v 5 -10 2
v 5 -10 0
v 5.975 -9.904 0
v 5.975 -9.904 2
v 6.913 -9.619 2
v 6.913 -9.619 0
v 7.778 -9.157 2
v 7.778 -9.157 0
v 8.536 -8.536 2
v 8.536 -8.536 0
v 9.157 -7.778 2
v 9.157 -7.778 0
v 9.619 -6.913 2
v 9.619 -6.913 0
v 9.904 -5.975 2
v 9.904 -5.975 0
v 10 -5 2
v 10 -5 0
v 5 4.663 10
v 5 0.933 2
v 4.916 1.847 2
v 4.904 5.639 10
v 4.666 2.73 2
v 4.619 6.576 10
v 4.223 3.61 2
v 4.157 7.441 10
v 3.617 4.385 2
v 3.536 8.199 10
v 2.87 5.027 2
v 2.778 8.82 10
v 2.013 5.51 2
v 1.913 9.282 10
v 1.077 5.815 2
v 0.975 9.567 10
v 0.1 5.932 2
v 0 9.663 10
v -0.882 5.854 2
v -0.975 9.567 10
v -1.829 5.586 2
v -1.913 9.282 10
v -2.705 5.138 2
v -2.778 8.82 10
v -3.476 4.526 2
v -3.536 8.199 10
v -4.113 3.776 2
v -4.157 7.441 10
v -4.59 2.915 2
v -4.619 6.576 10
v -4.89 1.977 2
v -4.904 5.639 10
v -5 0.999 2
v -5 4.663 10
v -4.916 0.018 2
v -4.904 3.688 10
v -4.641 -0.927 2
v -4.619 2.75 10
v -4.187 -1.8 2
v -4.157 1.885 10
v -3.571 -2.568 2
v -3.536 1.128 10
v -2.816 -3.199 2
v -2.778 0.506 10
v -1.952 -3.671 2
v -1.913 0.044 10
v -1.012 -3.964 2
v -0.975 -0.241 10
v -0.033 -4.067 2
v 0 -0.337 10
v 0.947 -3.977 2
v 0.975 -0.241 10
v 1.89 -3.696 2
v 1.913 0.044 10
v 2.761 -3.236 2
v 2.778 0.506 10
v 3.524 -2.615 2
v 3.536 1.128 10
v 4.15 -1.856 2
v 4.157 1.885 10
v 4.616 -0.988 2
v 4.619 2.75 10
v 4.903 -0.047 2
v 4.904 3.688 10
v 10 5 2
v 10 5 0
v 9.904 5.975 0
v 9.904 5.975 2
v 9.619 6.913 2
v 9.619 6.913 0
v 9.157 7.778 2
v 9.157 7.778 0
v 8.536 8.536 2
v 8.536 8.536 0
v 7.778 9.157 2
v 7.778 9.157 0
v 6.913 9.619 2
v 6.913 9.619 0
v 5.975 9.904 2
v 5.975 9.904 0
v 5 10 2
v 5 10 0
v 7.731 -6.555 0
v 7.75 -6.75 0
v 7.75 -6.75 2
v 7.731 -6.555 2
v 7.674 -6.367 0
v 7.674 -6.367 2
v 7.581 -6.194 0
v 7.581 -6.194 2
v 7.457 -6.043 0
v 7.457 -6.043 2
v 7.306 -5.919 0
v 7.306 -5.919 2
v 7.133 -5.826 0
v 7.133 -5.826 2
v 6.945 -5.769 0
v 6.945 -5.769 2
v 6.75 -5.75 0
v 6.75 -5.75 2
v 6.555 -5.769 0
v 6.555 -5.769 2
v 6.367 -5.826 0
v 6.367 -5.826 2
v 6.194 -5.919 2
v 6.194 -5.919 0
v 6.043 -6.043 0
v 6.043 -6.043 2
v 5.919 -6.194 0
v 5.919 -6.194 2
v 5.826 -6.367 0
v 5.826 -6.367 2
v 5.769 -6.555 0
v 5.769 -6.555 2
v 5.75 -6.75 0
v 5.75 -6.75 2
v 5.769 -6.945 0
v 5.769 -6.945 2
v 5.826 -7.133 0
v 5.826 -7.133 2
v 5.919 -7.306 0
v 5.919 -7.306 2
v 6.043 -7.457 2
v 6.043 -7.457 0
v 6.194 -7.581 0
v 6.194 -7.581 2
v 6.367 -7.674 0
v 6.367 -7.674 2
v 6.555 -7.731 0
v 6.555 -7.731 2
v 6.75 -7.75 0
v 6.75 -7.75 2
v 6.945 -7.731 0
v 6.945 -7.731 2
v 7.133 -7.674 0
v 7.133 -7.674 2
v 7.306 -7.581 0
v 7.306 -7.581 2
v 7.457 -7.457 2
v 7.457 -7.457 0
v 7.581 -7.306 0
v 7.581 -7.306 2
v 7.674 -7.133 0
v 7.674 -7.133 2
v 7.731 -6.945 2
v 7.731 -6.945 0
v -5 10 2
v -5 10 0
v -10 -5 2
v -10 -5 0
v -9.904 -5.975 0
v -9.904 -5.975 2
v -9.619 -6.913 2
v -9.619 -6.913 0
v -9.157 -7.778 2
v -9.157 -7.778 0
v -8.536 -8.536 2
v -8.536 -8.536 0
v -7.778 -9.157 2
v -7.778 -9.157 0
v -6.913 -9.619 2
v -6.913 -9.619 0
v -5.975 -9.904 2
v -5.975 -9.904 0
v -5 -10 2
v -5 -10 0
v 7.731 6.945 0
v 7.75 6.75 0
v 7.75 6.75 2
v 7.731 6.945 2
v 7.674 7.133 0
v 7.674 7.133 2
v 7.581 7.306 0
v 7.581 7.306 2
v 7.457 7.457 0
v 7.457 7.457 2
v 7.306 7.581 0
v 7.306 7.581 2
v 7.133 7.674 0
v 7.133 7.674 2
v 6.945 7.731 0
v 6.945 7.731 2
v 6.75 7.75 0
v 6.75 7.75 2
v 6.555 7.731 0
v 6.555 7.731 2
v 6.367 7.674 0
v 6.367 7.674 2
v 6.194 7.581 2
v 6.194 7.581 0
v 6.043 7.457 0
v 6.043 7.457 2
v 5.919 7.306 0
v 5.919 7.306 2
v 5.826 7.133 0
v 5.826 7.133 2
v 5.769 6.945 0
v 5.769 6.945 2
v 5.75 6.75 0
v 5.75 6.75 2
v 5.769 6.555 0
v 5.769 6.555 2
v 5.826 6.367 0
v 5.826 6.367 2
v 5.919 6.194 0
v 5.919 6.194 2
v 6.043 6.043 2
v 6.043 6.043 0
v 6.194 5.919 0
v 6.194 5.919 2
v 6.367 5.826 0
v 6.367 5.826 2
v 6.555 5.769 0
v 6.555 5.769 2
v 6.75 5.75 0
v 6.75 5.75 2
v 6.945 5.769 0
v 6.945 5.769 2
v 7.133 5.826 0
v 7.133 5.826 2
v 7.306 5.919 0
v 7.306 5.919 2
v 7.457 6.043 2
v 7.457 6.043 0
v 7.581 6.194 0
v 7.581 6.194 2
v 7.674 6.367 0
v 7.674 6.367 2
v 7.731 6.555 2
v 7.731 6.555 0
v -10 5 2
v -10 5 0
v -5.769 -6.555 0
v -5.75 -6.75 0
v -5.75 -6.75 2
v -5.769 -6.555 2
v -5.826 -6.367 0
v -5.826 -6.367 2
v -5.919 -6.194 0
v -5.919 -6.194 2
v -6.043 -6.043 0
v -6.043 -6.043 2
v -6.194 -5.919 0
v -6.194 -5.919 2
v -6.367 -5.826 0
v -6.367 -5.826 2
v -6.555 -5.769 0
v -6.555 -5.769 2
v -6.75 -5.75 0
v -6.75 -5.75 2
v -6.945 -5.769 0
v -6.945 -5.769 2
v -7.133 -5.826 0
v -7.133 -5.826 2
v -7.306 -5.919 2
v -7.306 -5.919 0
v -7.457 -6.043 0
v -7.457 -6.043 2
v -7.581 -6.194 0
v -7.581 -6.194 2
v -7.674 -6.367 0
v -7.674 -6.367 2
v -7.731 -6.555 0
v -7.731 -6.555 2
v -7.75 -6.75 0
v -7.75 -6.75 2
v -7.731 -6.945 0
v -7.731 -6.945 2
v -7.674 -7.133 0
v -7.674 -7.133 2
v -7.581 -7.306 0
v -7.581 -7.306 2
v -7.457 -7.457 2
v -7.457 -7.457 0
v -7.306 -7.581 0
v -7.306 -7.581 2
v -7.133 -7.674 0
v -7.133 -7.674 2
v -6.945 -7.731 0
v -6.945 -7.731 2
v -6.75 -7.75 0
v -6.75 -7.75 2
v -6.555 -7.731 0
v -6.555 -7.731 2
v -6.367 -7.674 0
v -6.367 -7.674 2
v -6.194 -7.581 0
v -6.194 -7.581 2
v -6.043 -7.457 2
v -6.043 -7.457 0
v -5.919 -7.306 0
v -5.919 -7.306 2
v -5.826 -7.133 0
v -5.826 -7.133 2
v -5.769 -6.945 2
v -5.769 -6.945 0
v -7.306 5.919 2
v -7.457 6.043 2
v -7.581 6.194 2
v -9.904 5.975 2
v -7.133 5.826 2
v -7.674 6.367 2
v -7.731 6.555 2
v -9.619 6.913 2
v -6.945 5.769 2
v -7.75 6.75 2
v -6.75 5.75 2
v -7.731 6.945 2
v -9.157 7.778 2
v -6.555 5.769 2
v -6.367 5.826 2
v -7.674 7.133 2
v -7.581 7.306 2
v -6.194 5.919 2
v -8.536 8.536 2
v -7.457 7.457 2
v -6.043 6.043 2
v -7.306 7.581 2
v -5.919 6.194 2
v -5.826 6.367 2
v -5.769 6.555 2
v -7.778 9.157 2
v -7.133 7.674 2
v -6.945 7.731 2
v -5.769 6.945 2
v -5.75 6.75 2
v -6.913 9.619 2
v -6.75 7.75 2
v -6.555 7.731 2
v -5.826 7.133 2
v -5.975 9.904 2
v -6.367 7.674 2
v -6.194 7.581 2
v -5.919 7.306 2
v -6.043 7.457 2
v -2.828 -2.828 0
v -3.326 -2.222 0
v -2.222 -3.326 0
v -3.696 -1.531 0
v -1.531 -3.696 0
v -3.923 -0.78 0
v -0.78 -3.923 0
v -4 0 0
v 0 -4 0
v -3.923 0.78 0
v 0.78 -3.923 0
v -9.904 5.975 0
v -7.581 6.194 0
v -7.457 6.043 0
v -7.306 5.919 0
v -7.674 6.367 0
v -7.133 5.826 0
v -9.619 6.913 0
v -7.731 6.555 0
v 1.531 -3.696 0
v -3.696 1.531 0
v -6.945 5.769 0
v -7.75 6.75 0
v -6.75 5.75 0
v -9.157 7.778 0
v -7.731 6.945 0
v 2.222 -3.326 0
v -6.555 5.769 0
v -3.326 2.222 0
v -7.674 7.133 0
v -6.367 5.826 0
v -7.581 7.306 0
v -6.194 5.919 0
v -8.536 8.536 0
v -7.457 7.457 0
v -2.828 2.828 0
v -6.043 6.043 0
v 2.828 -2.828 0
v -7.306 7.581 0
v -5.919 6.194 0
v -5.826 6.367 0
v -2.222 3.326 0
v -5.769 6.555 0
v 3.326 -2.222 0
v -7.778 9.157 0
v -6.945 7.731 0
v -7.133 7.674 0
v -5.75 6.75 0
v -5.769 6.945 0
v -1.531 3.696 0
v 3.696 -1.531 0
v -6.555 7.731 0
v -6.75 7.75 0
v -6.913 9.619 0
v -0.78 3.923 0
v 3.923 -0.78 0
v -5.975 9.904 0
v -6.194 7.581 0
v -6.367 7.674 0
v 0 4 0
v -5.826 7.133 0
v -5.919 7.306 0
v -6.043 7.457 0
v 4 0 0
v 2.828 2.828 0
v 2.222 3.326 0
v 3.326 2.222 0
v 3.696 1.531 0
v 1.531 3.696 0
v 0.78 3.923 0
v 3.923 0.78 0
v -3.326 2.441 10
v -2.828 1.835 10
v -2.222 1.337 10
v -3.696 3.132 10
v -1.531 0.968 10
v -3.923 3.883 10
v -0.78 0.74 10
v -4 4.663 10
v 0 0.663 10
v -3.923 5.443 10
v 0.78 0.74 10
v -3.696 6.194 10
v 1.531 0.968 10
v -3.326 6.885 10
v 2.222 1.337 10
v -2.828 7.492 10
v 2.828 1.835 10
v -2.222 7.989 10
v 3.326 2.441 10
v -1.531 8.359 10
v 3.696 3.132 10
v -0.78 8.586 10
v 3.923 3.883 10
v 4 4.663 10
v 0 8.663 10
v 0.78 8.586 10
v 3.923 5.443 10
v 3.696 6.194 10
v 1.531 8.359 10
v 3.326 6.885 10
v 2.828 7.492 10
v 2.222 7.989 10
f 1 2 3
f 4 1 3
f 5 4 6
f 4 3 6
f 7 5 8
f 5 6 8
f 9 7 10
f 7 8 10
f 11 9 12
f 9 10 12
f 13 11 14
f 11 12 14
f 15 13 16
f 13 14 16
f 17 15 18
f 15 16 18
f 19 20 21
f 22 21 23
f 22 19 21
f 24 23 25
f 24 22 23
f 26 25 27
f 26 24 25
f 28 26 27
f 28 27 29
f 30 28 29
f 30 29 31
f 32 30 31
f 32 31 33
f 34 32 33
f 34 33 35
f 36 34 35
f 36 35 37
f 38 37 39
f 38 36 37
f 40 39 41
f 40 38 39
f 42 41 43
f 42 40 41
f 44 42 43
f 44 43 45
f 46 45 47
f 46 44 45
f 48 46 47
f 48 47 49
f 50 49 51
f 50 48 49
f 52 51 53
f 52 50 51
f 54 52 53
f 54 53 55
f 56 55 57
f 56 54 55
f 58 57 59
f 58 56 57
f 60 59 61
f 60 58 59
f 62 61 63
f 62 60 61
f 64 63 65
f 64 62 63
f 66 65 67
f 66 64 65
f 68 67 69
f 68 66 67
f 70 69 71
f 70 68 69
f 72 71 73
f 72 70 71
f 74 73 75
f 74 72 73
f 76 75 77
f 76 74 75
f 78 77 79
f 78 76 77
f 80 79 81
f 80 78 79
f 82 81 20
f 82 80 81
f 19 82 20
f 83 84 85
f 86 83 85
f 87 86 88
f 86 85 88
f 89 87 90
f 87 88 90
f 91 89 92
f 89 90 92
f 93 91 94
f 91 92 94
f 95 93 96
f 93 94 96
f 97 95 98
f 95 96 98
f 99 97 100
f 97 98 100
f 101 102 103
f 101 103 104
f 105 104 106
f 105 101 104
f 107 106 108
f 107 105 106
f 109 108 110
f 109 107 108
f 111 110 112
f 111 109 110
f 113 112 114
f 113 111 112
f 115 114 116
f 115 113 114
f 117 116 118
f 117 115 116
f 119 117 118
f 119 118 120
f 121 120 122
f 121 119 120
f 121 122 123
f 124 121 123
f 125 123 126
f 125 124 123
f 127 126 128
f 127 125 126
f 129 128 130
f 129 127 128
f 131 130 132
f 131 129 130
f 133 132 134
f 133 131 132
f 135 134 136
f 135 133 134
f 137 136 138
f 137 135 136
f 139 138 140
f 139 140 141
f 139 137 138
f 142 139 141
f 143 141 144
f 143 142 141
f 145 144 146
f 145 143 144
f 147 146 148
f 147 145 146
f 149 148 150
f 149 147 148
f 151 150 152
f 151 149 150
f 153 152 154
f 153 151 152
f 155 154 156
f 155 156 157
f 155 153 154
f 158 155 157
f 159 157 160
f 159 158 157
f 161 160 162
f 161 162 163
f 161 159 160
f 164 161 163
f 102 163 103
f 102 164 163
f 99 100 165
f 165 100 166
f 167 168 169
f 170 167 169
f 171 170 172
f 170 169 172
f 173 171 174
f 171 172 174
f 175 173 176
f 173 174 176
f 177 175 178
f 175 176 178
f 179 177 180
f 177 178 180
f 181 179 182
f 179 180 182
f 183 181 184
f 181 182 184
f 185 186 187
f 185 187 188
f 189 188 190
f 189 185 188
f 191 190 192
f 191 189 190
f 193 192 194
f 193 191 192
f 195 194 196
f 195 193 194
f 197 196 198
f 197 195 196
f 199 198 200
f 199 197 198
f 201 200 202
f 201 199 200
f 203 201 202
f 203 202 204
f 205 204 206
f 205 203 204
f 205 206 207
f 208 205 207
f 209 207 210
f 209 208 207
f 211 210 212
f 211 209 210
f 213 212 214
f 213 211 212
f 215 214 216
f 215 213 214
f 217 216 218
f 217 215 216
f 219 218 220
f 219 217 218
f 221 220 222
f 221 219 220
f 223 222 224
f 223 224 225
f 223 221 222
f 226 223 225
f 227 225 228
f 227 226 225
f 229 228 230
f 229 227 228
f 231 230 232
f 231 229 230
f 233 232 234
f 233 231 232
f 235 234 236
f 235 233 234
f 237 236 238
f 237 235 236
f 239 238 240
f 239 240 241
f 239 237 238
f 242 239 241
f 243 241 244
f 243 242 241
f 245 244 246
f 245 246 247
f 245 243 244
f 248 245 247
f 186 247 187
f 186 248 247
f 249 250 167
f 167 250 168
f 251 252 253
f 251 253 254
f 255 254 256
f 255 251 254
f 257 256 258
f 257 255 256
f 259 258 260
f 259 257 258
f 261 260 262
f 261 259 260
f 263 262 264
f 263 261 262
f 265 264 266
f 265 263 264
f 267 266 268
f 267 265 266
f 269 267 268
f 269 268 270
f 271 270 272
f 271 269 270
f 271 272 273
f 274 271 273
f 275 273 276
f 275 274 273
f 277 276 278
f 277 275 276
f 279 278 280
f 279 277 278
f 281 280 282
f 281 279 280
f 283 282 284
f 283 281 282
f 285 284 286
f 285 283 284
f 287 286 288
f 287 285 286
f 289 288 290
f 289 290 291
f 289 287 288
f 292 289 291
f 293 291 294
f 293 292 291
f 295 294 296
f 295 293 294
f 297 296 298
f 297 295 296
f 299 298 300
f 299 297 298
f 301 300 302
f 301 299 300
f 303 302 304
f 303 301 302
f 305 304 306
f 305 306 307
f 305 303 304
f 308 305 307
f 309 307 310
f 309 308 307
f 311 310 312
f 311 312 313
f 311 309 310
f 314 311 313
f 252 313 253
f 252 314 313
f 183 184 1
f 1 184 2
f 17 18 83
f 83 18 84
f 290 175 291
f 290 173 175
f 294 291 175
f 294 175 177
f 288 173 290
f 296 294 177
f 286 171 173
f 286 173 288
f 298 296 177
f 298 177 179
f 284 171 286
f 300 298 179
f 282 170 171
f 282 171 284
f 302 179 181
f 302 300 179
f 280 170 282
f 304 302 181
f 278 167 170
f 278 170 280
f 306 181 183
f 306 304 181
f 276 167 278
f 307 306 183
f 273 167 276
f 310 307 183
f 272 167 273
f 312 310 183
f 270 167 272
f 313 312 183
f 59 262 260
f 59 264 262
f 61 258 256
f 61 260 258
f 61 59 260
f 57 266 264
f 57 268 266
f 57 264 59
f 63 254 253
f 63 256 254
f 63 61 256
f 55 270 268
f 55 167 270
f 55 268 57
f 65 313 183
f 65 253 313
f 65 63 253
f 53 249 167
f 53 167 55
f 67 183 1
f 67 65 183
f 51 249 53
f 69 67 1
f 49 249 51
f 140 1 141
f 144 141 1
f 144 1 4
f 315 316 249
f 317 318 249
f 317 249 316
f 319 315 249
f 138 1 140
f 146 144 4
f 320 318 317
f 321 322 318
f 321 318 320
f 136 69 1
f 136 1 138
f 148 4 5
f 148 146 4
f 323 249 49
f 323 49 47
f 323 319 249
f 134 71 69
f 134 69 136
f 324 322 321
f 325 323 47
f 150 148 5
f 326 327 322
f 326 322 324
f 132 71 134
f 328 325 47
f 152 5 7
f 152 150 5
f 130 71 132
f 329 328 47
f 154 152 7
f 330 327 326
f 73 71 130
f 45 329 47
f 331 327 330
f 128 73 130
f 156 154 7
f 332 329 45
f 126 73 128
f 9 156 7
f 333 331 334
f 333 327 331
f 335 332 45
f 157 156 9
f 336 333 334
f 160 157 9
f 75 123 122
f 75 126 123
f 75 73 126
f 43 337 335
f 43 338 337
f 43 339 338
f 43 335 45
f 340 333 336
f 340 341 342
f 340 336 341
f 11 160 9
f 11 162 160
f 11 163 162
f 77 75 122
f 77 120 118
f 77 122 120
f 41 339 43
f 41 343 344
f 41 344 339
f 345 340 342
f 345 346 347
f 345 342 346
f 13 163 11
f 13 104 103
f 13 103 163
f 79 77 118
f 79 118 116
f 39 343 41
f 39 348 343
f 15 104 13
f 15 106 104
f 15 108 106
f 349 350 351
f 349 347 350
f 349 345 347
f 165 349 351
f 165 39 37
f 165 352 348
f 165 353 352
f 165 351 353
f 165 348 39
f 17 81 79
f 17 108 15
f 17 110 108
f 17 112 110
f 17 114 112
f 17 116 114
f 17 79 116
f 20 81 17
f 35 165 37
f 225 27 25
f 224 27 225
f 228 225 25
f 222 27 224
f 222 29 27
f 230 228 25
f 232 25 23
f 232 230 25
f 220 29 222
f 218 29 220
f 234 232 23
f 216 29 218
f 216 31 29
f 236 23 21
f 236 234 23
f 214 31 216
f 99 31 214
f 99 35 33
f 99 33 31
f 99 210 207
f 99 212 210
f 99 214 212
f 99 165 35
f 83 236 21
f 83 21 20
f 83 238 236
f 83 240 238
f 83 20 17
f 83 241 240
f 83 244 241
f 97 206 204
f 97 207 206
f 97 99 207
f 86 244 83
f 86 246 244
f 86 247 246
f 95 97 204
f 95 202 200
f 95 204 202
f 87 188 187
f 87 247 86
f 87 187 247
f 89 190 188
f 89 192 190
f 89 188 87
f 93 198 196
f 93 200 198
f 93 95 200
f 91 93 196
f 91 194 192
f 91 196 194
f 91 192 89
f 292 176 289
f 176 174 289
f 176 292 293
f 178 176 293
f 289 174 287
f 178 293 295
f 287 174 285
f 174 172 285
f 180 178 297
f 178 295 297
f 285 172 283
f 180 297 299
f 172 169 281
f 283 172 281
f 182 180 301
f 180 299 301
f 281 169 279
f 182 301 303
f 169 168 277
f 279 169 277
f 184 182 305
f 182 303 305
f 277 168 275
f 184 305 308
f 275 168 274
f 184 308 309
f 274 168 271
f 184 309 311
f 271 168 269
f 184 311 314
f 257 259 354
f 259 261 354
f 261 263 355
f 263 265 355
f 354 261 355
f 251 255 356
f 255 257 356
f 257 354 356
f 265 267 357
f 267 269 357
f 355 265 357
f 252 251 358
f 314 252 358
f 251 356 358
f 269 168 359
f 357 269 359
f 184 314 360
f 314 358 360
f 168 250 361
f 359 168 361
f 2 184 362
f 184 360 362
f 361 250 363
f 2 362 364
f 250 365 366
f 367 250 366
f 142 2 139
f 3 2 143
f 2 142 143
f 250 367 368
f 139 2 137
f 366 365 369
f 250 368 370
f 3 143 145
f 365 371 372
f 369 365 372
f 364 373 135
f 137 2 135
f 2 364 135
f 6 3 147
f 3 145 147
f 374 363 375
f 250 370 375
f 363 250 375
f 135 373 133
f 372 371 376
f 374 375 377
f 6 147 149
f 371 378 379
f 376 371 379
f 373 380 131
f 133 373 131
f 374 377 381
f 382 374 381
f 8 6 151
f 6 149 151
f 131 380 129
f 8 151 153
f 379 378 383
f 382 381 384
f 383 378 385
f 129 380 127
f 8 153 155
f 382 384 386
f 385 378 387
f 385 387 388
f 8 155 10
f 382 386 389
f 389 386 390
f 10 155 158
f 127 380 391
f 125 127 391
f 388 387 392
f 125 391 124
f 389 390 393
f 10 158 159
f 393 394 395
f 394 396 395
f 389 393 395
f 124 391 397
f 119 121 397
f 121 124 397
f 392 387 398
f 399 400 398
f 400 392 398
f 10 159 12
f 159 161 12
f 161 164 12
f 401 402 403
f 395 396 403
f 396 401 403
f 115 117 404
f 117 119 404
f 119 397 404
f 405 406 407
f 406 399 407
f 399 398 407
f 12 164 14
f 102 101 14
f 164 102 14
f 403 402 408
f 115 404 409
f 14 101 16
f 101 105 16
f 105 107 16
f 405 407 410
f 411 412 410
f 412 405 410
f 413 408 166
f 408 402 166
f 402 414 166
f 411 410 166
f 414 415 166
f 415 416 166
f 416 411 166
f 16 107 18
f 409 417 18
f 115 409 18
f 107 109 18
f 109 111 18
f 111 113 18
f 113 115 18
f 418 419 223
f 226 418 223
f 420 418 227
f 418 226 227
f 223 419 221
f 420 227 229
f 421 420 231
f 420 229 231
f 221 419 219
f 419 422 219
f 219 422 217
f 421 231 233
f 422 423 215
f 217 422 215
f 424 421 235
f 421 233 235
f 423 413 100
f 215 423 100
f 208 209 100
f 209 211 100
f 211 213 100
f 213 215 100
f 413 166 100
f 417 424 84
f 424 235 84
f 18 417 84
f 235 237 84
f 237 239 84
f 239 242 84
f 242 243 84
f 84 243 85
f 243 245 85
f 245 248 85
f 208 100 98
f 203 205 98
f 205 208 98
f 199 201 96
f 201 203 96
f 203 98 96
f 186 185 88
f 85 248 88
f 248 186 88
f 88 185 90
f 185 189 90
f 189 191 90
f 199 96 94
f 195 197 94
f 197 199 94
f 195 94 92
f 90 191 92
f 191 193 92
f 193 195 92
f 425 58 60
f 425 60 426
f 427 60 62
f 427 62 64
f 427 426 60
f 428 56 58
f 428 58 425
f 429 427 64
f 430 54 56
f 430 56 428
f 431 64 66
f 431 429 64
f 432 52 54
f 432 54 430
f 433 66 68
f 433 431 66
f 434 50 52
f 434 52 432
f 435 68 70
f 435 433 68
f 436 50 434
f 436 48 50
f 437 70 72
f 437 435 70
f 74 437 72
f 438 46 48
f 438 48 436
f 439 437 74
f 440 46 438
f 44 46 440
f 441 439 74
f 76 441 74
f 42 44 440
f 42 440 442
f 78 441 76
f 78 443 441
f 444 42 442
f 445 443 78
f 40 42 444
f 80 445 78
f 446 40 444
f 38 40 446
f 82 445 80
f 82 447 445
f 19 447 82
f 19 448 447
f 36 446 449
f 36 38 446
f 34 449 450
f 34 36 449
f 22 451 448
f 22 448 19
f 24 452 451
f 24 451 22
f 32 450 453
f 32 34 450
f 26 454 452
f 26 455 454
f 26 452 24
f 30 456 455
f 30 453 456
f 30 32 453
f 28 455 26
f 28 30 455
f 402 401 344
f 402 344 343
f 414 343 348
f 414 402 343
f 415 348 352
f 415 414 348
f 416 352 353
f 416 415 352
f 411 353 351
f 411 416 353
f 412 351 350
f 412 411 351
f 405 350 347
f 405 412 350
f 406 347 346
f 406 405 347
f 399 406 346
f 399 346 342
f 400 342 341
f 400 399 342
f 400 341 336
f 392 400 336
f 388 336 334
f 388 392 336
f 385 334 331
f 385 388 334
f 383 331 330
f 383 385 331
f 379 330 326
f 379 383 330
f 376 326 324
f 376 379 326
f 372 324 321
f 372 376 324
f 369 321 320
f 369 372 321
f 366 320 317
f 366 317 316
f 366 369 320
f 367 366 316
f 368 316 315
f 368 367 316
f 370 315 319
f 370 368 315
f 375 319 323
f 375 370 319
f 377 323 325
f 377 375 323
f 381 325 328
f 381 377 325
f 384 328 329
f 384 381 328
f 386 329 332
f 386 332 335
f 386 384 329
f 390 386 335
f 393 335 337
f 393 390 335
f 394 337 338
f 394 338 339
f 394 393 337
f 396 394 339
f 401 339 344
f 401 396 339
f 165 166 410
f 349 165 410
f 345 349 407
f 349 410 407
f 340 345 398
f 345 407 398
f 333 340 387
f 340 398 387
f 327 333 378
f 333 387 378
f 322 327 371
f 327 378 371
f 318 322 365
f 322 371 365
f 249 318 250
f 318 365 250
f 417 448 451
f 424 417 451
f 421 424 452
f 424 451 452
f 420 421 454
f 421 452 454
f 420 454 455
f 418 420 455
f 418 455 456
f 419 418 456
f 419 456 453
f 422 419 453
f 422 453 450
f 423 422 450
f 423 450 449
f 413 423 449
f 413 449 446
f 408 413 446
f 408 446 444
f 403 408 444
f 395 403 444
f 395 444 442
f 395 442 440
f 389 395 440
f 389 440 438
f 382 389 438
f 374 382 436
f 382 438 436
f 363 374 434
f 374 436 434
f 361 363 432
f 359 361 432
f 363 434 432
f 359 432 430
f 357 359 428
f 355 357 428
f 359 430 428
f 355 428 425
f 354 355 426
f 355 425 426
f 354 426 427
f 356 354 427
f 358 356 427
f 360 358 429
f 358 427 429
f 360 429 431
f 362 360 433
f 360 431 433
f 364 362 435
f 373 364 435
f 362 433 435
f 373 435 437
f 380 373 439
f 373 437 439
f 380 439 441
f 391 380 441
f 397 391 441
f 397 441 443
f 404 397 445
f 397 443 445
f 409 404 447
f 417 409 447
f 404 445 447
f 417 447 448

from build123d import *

# Parameters (mm, degrees)
F0_R     = 1
F0_R_2   = 5
F0_R_3   = 4
F1_DEPTH = 2


with BuildPart() as f1:
    # F0 (on Top) → F1 (new body)
    with BuildSketch(Plane.XY):
        with BuildLine():
            Line((5, 10), (-5, 10))
            ThreePointArc((-5, 10), (-8.535534, 8.535534), (-10, 5))
            Line((-10, 5), (-10, -5))
            ThreePointArc((-10, -5), (-8.535534, -8.535534), (-5, -10))
            Line((-5, -10), (5, -10))
            ThreePointArc((5, -10), (8.535534, -8.535534), (10, -5))
            Line((10, -5), (10, 5))
            ThreePointArc((10, 5), (8.535534, 8.535534), (5, 10))
        make_face()
        with Locations((-6.75, -6.75)):
            Circle(F0_R, mode=Mode.SUBTRACT)
        with Locations((6.75, -6.75)):
            Circle(F0_R, mode=Mode.SUBTRACT)
        with Locations((-6.75, 6.75)):
            Circle(F0_R, mode=Mode.SUBTRACT)
        Circle(F0_R_2, mode=Mode.SUBTRACT)
        with Locations((6.75, 6.75)):
            Circle(F0_R, mode=Mode.SUBTRACT)
        Circle(F0_R_2)
        Circle(F0_R_3, mode=Mode.SUBTRACT)
        Circle(F0_R_3)
    extrude(amount=F1_DEPTH)

    # F3: sweep along a path in F2
    with BuildLine(Plane.YZ) as f3_path:
        Line((4, 0), (8.663077, 10))
    # F0 (on Top) → F3 (sweep)
    with BuildSketch(Plane.XY):
        Circle(F0_R_2)
        Circle(F0_R_3, mode=Mode.SUBTRACT)
        Circle(F0_R_3)
    sweep(path=f3_path.line)

    # F4: sweep along a path in F2
    with BuildLine(Plane.YZ) as f4_path:
        Line((4, 0), (8.663077, 10))
    # F0 (on Top) → F4 (sweep, cut)
    with BuildSketch(Plane.XY):
        Circle(F0_R_3)
    sweep(path=f4_path.line, mode=Mode.SUBTRACT)


solid = f1.part
